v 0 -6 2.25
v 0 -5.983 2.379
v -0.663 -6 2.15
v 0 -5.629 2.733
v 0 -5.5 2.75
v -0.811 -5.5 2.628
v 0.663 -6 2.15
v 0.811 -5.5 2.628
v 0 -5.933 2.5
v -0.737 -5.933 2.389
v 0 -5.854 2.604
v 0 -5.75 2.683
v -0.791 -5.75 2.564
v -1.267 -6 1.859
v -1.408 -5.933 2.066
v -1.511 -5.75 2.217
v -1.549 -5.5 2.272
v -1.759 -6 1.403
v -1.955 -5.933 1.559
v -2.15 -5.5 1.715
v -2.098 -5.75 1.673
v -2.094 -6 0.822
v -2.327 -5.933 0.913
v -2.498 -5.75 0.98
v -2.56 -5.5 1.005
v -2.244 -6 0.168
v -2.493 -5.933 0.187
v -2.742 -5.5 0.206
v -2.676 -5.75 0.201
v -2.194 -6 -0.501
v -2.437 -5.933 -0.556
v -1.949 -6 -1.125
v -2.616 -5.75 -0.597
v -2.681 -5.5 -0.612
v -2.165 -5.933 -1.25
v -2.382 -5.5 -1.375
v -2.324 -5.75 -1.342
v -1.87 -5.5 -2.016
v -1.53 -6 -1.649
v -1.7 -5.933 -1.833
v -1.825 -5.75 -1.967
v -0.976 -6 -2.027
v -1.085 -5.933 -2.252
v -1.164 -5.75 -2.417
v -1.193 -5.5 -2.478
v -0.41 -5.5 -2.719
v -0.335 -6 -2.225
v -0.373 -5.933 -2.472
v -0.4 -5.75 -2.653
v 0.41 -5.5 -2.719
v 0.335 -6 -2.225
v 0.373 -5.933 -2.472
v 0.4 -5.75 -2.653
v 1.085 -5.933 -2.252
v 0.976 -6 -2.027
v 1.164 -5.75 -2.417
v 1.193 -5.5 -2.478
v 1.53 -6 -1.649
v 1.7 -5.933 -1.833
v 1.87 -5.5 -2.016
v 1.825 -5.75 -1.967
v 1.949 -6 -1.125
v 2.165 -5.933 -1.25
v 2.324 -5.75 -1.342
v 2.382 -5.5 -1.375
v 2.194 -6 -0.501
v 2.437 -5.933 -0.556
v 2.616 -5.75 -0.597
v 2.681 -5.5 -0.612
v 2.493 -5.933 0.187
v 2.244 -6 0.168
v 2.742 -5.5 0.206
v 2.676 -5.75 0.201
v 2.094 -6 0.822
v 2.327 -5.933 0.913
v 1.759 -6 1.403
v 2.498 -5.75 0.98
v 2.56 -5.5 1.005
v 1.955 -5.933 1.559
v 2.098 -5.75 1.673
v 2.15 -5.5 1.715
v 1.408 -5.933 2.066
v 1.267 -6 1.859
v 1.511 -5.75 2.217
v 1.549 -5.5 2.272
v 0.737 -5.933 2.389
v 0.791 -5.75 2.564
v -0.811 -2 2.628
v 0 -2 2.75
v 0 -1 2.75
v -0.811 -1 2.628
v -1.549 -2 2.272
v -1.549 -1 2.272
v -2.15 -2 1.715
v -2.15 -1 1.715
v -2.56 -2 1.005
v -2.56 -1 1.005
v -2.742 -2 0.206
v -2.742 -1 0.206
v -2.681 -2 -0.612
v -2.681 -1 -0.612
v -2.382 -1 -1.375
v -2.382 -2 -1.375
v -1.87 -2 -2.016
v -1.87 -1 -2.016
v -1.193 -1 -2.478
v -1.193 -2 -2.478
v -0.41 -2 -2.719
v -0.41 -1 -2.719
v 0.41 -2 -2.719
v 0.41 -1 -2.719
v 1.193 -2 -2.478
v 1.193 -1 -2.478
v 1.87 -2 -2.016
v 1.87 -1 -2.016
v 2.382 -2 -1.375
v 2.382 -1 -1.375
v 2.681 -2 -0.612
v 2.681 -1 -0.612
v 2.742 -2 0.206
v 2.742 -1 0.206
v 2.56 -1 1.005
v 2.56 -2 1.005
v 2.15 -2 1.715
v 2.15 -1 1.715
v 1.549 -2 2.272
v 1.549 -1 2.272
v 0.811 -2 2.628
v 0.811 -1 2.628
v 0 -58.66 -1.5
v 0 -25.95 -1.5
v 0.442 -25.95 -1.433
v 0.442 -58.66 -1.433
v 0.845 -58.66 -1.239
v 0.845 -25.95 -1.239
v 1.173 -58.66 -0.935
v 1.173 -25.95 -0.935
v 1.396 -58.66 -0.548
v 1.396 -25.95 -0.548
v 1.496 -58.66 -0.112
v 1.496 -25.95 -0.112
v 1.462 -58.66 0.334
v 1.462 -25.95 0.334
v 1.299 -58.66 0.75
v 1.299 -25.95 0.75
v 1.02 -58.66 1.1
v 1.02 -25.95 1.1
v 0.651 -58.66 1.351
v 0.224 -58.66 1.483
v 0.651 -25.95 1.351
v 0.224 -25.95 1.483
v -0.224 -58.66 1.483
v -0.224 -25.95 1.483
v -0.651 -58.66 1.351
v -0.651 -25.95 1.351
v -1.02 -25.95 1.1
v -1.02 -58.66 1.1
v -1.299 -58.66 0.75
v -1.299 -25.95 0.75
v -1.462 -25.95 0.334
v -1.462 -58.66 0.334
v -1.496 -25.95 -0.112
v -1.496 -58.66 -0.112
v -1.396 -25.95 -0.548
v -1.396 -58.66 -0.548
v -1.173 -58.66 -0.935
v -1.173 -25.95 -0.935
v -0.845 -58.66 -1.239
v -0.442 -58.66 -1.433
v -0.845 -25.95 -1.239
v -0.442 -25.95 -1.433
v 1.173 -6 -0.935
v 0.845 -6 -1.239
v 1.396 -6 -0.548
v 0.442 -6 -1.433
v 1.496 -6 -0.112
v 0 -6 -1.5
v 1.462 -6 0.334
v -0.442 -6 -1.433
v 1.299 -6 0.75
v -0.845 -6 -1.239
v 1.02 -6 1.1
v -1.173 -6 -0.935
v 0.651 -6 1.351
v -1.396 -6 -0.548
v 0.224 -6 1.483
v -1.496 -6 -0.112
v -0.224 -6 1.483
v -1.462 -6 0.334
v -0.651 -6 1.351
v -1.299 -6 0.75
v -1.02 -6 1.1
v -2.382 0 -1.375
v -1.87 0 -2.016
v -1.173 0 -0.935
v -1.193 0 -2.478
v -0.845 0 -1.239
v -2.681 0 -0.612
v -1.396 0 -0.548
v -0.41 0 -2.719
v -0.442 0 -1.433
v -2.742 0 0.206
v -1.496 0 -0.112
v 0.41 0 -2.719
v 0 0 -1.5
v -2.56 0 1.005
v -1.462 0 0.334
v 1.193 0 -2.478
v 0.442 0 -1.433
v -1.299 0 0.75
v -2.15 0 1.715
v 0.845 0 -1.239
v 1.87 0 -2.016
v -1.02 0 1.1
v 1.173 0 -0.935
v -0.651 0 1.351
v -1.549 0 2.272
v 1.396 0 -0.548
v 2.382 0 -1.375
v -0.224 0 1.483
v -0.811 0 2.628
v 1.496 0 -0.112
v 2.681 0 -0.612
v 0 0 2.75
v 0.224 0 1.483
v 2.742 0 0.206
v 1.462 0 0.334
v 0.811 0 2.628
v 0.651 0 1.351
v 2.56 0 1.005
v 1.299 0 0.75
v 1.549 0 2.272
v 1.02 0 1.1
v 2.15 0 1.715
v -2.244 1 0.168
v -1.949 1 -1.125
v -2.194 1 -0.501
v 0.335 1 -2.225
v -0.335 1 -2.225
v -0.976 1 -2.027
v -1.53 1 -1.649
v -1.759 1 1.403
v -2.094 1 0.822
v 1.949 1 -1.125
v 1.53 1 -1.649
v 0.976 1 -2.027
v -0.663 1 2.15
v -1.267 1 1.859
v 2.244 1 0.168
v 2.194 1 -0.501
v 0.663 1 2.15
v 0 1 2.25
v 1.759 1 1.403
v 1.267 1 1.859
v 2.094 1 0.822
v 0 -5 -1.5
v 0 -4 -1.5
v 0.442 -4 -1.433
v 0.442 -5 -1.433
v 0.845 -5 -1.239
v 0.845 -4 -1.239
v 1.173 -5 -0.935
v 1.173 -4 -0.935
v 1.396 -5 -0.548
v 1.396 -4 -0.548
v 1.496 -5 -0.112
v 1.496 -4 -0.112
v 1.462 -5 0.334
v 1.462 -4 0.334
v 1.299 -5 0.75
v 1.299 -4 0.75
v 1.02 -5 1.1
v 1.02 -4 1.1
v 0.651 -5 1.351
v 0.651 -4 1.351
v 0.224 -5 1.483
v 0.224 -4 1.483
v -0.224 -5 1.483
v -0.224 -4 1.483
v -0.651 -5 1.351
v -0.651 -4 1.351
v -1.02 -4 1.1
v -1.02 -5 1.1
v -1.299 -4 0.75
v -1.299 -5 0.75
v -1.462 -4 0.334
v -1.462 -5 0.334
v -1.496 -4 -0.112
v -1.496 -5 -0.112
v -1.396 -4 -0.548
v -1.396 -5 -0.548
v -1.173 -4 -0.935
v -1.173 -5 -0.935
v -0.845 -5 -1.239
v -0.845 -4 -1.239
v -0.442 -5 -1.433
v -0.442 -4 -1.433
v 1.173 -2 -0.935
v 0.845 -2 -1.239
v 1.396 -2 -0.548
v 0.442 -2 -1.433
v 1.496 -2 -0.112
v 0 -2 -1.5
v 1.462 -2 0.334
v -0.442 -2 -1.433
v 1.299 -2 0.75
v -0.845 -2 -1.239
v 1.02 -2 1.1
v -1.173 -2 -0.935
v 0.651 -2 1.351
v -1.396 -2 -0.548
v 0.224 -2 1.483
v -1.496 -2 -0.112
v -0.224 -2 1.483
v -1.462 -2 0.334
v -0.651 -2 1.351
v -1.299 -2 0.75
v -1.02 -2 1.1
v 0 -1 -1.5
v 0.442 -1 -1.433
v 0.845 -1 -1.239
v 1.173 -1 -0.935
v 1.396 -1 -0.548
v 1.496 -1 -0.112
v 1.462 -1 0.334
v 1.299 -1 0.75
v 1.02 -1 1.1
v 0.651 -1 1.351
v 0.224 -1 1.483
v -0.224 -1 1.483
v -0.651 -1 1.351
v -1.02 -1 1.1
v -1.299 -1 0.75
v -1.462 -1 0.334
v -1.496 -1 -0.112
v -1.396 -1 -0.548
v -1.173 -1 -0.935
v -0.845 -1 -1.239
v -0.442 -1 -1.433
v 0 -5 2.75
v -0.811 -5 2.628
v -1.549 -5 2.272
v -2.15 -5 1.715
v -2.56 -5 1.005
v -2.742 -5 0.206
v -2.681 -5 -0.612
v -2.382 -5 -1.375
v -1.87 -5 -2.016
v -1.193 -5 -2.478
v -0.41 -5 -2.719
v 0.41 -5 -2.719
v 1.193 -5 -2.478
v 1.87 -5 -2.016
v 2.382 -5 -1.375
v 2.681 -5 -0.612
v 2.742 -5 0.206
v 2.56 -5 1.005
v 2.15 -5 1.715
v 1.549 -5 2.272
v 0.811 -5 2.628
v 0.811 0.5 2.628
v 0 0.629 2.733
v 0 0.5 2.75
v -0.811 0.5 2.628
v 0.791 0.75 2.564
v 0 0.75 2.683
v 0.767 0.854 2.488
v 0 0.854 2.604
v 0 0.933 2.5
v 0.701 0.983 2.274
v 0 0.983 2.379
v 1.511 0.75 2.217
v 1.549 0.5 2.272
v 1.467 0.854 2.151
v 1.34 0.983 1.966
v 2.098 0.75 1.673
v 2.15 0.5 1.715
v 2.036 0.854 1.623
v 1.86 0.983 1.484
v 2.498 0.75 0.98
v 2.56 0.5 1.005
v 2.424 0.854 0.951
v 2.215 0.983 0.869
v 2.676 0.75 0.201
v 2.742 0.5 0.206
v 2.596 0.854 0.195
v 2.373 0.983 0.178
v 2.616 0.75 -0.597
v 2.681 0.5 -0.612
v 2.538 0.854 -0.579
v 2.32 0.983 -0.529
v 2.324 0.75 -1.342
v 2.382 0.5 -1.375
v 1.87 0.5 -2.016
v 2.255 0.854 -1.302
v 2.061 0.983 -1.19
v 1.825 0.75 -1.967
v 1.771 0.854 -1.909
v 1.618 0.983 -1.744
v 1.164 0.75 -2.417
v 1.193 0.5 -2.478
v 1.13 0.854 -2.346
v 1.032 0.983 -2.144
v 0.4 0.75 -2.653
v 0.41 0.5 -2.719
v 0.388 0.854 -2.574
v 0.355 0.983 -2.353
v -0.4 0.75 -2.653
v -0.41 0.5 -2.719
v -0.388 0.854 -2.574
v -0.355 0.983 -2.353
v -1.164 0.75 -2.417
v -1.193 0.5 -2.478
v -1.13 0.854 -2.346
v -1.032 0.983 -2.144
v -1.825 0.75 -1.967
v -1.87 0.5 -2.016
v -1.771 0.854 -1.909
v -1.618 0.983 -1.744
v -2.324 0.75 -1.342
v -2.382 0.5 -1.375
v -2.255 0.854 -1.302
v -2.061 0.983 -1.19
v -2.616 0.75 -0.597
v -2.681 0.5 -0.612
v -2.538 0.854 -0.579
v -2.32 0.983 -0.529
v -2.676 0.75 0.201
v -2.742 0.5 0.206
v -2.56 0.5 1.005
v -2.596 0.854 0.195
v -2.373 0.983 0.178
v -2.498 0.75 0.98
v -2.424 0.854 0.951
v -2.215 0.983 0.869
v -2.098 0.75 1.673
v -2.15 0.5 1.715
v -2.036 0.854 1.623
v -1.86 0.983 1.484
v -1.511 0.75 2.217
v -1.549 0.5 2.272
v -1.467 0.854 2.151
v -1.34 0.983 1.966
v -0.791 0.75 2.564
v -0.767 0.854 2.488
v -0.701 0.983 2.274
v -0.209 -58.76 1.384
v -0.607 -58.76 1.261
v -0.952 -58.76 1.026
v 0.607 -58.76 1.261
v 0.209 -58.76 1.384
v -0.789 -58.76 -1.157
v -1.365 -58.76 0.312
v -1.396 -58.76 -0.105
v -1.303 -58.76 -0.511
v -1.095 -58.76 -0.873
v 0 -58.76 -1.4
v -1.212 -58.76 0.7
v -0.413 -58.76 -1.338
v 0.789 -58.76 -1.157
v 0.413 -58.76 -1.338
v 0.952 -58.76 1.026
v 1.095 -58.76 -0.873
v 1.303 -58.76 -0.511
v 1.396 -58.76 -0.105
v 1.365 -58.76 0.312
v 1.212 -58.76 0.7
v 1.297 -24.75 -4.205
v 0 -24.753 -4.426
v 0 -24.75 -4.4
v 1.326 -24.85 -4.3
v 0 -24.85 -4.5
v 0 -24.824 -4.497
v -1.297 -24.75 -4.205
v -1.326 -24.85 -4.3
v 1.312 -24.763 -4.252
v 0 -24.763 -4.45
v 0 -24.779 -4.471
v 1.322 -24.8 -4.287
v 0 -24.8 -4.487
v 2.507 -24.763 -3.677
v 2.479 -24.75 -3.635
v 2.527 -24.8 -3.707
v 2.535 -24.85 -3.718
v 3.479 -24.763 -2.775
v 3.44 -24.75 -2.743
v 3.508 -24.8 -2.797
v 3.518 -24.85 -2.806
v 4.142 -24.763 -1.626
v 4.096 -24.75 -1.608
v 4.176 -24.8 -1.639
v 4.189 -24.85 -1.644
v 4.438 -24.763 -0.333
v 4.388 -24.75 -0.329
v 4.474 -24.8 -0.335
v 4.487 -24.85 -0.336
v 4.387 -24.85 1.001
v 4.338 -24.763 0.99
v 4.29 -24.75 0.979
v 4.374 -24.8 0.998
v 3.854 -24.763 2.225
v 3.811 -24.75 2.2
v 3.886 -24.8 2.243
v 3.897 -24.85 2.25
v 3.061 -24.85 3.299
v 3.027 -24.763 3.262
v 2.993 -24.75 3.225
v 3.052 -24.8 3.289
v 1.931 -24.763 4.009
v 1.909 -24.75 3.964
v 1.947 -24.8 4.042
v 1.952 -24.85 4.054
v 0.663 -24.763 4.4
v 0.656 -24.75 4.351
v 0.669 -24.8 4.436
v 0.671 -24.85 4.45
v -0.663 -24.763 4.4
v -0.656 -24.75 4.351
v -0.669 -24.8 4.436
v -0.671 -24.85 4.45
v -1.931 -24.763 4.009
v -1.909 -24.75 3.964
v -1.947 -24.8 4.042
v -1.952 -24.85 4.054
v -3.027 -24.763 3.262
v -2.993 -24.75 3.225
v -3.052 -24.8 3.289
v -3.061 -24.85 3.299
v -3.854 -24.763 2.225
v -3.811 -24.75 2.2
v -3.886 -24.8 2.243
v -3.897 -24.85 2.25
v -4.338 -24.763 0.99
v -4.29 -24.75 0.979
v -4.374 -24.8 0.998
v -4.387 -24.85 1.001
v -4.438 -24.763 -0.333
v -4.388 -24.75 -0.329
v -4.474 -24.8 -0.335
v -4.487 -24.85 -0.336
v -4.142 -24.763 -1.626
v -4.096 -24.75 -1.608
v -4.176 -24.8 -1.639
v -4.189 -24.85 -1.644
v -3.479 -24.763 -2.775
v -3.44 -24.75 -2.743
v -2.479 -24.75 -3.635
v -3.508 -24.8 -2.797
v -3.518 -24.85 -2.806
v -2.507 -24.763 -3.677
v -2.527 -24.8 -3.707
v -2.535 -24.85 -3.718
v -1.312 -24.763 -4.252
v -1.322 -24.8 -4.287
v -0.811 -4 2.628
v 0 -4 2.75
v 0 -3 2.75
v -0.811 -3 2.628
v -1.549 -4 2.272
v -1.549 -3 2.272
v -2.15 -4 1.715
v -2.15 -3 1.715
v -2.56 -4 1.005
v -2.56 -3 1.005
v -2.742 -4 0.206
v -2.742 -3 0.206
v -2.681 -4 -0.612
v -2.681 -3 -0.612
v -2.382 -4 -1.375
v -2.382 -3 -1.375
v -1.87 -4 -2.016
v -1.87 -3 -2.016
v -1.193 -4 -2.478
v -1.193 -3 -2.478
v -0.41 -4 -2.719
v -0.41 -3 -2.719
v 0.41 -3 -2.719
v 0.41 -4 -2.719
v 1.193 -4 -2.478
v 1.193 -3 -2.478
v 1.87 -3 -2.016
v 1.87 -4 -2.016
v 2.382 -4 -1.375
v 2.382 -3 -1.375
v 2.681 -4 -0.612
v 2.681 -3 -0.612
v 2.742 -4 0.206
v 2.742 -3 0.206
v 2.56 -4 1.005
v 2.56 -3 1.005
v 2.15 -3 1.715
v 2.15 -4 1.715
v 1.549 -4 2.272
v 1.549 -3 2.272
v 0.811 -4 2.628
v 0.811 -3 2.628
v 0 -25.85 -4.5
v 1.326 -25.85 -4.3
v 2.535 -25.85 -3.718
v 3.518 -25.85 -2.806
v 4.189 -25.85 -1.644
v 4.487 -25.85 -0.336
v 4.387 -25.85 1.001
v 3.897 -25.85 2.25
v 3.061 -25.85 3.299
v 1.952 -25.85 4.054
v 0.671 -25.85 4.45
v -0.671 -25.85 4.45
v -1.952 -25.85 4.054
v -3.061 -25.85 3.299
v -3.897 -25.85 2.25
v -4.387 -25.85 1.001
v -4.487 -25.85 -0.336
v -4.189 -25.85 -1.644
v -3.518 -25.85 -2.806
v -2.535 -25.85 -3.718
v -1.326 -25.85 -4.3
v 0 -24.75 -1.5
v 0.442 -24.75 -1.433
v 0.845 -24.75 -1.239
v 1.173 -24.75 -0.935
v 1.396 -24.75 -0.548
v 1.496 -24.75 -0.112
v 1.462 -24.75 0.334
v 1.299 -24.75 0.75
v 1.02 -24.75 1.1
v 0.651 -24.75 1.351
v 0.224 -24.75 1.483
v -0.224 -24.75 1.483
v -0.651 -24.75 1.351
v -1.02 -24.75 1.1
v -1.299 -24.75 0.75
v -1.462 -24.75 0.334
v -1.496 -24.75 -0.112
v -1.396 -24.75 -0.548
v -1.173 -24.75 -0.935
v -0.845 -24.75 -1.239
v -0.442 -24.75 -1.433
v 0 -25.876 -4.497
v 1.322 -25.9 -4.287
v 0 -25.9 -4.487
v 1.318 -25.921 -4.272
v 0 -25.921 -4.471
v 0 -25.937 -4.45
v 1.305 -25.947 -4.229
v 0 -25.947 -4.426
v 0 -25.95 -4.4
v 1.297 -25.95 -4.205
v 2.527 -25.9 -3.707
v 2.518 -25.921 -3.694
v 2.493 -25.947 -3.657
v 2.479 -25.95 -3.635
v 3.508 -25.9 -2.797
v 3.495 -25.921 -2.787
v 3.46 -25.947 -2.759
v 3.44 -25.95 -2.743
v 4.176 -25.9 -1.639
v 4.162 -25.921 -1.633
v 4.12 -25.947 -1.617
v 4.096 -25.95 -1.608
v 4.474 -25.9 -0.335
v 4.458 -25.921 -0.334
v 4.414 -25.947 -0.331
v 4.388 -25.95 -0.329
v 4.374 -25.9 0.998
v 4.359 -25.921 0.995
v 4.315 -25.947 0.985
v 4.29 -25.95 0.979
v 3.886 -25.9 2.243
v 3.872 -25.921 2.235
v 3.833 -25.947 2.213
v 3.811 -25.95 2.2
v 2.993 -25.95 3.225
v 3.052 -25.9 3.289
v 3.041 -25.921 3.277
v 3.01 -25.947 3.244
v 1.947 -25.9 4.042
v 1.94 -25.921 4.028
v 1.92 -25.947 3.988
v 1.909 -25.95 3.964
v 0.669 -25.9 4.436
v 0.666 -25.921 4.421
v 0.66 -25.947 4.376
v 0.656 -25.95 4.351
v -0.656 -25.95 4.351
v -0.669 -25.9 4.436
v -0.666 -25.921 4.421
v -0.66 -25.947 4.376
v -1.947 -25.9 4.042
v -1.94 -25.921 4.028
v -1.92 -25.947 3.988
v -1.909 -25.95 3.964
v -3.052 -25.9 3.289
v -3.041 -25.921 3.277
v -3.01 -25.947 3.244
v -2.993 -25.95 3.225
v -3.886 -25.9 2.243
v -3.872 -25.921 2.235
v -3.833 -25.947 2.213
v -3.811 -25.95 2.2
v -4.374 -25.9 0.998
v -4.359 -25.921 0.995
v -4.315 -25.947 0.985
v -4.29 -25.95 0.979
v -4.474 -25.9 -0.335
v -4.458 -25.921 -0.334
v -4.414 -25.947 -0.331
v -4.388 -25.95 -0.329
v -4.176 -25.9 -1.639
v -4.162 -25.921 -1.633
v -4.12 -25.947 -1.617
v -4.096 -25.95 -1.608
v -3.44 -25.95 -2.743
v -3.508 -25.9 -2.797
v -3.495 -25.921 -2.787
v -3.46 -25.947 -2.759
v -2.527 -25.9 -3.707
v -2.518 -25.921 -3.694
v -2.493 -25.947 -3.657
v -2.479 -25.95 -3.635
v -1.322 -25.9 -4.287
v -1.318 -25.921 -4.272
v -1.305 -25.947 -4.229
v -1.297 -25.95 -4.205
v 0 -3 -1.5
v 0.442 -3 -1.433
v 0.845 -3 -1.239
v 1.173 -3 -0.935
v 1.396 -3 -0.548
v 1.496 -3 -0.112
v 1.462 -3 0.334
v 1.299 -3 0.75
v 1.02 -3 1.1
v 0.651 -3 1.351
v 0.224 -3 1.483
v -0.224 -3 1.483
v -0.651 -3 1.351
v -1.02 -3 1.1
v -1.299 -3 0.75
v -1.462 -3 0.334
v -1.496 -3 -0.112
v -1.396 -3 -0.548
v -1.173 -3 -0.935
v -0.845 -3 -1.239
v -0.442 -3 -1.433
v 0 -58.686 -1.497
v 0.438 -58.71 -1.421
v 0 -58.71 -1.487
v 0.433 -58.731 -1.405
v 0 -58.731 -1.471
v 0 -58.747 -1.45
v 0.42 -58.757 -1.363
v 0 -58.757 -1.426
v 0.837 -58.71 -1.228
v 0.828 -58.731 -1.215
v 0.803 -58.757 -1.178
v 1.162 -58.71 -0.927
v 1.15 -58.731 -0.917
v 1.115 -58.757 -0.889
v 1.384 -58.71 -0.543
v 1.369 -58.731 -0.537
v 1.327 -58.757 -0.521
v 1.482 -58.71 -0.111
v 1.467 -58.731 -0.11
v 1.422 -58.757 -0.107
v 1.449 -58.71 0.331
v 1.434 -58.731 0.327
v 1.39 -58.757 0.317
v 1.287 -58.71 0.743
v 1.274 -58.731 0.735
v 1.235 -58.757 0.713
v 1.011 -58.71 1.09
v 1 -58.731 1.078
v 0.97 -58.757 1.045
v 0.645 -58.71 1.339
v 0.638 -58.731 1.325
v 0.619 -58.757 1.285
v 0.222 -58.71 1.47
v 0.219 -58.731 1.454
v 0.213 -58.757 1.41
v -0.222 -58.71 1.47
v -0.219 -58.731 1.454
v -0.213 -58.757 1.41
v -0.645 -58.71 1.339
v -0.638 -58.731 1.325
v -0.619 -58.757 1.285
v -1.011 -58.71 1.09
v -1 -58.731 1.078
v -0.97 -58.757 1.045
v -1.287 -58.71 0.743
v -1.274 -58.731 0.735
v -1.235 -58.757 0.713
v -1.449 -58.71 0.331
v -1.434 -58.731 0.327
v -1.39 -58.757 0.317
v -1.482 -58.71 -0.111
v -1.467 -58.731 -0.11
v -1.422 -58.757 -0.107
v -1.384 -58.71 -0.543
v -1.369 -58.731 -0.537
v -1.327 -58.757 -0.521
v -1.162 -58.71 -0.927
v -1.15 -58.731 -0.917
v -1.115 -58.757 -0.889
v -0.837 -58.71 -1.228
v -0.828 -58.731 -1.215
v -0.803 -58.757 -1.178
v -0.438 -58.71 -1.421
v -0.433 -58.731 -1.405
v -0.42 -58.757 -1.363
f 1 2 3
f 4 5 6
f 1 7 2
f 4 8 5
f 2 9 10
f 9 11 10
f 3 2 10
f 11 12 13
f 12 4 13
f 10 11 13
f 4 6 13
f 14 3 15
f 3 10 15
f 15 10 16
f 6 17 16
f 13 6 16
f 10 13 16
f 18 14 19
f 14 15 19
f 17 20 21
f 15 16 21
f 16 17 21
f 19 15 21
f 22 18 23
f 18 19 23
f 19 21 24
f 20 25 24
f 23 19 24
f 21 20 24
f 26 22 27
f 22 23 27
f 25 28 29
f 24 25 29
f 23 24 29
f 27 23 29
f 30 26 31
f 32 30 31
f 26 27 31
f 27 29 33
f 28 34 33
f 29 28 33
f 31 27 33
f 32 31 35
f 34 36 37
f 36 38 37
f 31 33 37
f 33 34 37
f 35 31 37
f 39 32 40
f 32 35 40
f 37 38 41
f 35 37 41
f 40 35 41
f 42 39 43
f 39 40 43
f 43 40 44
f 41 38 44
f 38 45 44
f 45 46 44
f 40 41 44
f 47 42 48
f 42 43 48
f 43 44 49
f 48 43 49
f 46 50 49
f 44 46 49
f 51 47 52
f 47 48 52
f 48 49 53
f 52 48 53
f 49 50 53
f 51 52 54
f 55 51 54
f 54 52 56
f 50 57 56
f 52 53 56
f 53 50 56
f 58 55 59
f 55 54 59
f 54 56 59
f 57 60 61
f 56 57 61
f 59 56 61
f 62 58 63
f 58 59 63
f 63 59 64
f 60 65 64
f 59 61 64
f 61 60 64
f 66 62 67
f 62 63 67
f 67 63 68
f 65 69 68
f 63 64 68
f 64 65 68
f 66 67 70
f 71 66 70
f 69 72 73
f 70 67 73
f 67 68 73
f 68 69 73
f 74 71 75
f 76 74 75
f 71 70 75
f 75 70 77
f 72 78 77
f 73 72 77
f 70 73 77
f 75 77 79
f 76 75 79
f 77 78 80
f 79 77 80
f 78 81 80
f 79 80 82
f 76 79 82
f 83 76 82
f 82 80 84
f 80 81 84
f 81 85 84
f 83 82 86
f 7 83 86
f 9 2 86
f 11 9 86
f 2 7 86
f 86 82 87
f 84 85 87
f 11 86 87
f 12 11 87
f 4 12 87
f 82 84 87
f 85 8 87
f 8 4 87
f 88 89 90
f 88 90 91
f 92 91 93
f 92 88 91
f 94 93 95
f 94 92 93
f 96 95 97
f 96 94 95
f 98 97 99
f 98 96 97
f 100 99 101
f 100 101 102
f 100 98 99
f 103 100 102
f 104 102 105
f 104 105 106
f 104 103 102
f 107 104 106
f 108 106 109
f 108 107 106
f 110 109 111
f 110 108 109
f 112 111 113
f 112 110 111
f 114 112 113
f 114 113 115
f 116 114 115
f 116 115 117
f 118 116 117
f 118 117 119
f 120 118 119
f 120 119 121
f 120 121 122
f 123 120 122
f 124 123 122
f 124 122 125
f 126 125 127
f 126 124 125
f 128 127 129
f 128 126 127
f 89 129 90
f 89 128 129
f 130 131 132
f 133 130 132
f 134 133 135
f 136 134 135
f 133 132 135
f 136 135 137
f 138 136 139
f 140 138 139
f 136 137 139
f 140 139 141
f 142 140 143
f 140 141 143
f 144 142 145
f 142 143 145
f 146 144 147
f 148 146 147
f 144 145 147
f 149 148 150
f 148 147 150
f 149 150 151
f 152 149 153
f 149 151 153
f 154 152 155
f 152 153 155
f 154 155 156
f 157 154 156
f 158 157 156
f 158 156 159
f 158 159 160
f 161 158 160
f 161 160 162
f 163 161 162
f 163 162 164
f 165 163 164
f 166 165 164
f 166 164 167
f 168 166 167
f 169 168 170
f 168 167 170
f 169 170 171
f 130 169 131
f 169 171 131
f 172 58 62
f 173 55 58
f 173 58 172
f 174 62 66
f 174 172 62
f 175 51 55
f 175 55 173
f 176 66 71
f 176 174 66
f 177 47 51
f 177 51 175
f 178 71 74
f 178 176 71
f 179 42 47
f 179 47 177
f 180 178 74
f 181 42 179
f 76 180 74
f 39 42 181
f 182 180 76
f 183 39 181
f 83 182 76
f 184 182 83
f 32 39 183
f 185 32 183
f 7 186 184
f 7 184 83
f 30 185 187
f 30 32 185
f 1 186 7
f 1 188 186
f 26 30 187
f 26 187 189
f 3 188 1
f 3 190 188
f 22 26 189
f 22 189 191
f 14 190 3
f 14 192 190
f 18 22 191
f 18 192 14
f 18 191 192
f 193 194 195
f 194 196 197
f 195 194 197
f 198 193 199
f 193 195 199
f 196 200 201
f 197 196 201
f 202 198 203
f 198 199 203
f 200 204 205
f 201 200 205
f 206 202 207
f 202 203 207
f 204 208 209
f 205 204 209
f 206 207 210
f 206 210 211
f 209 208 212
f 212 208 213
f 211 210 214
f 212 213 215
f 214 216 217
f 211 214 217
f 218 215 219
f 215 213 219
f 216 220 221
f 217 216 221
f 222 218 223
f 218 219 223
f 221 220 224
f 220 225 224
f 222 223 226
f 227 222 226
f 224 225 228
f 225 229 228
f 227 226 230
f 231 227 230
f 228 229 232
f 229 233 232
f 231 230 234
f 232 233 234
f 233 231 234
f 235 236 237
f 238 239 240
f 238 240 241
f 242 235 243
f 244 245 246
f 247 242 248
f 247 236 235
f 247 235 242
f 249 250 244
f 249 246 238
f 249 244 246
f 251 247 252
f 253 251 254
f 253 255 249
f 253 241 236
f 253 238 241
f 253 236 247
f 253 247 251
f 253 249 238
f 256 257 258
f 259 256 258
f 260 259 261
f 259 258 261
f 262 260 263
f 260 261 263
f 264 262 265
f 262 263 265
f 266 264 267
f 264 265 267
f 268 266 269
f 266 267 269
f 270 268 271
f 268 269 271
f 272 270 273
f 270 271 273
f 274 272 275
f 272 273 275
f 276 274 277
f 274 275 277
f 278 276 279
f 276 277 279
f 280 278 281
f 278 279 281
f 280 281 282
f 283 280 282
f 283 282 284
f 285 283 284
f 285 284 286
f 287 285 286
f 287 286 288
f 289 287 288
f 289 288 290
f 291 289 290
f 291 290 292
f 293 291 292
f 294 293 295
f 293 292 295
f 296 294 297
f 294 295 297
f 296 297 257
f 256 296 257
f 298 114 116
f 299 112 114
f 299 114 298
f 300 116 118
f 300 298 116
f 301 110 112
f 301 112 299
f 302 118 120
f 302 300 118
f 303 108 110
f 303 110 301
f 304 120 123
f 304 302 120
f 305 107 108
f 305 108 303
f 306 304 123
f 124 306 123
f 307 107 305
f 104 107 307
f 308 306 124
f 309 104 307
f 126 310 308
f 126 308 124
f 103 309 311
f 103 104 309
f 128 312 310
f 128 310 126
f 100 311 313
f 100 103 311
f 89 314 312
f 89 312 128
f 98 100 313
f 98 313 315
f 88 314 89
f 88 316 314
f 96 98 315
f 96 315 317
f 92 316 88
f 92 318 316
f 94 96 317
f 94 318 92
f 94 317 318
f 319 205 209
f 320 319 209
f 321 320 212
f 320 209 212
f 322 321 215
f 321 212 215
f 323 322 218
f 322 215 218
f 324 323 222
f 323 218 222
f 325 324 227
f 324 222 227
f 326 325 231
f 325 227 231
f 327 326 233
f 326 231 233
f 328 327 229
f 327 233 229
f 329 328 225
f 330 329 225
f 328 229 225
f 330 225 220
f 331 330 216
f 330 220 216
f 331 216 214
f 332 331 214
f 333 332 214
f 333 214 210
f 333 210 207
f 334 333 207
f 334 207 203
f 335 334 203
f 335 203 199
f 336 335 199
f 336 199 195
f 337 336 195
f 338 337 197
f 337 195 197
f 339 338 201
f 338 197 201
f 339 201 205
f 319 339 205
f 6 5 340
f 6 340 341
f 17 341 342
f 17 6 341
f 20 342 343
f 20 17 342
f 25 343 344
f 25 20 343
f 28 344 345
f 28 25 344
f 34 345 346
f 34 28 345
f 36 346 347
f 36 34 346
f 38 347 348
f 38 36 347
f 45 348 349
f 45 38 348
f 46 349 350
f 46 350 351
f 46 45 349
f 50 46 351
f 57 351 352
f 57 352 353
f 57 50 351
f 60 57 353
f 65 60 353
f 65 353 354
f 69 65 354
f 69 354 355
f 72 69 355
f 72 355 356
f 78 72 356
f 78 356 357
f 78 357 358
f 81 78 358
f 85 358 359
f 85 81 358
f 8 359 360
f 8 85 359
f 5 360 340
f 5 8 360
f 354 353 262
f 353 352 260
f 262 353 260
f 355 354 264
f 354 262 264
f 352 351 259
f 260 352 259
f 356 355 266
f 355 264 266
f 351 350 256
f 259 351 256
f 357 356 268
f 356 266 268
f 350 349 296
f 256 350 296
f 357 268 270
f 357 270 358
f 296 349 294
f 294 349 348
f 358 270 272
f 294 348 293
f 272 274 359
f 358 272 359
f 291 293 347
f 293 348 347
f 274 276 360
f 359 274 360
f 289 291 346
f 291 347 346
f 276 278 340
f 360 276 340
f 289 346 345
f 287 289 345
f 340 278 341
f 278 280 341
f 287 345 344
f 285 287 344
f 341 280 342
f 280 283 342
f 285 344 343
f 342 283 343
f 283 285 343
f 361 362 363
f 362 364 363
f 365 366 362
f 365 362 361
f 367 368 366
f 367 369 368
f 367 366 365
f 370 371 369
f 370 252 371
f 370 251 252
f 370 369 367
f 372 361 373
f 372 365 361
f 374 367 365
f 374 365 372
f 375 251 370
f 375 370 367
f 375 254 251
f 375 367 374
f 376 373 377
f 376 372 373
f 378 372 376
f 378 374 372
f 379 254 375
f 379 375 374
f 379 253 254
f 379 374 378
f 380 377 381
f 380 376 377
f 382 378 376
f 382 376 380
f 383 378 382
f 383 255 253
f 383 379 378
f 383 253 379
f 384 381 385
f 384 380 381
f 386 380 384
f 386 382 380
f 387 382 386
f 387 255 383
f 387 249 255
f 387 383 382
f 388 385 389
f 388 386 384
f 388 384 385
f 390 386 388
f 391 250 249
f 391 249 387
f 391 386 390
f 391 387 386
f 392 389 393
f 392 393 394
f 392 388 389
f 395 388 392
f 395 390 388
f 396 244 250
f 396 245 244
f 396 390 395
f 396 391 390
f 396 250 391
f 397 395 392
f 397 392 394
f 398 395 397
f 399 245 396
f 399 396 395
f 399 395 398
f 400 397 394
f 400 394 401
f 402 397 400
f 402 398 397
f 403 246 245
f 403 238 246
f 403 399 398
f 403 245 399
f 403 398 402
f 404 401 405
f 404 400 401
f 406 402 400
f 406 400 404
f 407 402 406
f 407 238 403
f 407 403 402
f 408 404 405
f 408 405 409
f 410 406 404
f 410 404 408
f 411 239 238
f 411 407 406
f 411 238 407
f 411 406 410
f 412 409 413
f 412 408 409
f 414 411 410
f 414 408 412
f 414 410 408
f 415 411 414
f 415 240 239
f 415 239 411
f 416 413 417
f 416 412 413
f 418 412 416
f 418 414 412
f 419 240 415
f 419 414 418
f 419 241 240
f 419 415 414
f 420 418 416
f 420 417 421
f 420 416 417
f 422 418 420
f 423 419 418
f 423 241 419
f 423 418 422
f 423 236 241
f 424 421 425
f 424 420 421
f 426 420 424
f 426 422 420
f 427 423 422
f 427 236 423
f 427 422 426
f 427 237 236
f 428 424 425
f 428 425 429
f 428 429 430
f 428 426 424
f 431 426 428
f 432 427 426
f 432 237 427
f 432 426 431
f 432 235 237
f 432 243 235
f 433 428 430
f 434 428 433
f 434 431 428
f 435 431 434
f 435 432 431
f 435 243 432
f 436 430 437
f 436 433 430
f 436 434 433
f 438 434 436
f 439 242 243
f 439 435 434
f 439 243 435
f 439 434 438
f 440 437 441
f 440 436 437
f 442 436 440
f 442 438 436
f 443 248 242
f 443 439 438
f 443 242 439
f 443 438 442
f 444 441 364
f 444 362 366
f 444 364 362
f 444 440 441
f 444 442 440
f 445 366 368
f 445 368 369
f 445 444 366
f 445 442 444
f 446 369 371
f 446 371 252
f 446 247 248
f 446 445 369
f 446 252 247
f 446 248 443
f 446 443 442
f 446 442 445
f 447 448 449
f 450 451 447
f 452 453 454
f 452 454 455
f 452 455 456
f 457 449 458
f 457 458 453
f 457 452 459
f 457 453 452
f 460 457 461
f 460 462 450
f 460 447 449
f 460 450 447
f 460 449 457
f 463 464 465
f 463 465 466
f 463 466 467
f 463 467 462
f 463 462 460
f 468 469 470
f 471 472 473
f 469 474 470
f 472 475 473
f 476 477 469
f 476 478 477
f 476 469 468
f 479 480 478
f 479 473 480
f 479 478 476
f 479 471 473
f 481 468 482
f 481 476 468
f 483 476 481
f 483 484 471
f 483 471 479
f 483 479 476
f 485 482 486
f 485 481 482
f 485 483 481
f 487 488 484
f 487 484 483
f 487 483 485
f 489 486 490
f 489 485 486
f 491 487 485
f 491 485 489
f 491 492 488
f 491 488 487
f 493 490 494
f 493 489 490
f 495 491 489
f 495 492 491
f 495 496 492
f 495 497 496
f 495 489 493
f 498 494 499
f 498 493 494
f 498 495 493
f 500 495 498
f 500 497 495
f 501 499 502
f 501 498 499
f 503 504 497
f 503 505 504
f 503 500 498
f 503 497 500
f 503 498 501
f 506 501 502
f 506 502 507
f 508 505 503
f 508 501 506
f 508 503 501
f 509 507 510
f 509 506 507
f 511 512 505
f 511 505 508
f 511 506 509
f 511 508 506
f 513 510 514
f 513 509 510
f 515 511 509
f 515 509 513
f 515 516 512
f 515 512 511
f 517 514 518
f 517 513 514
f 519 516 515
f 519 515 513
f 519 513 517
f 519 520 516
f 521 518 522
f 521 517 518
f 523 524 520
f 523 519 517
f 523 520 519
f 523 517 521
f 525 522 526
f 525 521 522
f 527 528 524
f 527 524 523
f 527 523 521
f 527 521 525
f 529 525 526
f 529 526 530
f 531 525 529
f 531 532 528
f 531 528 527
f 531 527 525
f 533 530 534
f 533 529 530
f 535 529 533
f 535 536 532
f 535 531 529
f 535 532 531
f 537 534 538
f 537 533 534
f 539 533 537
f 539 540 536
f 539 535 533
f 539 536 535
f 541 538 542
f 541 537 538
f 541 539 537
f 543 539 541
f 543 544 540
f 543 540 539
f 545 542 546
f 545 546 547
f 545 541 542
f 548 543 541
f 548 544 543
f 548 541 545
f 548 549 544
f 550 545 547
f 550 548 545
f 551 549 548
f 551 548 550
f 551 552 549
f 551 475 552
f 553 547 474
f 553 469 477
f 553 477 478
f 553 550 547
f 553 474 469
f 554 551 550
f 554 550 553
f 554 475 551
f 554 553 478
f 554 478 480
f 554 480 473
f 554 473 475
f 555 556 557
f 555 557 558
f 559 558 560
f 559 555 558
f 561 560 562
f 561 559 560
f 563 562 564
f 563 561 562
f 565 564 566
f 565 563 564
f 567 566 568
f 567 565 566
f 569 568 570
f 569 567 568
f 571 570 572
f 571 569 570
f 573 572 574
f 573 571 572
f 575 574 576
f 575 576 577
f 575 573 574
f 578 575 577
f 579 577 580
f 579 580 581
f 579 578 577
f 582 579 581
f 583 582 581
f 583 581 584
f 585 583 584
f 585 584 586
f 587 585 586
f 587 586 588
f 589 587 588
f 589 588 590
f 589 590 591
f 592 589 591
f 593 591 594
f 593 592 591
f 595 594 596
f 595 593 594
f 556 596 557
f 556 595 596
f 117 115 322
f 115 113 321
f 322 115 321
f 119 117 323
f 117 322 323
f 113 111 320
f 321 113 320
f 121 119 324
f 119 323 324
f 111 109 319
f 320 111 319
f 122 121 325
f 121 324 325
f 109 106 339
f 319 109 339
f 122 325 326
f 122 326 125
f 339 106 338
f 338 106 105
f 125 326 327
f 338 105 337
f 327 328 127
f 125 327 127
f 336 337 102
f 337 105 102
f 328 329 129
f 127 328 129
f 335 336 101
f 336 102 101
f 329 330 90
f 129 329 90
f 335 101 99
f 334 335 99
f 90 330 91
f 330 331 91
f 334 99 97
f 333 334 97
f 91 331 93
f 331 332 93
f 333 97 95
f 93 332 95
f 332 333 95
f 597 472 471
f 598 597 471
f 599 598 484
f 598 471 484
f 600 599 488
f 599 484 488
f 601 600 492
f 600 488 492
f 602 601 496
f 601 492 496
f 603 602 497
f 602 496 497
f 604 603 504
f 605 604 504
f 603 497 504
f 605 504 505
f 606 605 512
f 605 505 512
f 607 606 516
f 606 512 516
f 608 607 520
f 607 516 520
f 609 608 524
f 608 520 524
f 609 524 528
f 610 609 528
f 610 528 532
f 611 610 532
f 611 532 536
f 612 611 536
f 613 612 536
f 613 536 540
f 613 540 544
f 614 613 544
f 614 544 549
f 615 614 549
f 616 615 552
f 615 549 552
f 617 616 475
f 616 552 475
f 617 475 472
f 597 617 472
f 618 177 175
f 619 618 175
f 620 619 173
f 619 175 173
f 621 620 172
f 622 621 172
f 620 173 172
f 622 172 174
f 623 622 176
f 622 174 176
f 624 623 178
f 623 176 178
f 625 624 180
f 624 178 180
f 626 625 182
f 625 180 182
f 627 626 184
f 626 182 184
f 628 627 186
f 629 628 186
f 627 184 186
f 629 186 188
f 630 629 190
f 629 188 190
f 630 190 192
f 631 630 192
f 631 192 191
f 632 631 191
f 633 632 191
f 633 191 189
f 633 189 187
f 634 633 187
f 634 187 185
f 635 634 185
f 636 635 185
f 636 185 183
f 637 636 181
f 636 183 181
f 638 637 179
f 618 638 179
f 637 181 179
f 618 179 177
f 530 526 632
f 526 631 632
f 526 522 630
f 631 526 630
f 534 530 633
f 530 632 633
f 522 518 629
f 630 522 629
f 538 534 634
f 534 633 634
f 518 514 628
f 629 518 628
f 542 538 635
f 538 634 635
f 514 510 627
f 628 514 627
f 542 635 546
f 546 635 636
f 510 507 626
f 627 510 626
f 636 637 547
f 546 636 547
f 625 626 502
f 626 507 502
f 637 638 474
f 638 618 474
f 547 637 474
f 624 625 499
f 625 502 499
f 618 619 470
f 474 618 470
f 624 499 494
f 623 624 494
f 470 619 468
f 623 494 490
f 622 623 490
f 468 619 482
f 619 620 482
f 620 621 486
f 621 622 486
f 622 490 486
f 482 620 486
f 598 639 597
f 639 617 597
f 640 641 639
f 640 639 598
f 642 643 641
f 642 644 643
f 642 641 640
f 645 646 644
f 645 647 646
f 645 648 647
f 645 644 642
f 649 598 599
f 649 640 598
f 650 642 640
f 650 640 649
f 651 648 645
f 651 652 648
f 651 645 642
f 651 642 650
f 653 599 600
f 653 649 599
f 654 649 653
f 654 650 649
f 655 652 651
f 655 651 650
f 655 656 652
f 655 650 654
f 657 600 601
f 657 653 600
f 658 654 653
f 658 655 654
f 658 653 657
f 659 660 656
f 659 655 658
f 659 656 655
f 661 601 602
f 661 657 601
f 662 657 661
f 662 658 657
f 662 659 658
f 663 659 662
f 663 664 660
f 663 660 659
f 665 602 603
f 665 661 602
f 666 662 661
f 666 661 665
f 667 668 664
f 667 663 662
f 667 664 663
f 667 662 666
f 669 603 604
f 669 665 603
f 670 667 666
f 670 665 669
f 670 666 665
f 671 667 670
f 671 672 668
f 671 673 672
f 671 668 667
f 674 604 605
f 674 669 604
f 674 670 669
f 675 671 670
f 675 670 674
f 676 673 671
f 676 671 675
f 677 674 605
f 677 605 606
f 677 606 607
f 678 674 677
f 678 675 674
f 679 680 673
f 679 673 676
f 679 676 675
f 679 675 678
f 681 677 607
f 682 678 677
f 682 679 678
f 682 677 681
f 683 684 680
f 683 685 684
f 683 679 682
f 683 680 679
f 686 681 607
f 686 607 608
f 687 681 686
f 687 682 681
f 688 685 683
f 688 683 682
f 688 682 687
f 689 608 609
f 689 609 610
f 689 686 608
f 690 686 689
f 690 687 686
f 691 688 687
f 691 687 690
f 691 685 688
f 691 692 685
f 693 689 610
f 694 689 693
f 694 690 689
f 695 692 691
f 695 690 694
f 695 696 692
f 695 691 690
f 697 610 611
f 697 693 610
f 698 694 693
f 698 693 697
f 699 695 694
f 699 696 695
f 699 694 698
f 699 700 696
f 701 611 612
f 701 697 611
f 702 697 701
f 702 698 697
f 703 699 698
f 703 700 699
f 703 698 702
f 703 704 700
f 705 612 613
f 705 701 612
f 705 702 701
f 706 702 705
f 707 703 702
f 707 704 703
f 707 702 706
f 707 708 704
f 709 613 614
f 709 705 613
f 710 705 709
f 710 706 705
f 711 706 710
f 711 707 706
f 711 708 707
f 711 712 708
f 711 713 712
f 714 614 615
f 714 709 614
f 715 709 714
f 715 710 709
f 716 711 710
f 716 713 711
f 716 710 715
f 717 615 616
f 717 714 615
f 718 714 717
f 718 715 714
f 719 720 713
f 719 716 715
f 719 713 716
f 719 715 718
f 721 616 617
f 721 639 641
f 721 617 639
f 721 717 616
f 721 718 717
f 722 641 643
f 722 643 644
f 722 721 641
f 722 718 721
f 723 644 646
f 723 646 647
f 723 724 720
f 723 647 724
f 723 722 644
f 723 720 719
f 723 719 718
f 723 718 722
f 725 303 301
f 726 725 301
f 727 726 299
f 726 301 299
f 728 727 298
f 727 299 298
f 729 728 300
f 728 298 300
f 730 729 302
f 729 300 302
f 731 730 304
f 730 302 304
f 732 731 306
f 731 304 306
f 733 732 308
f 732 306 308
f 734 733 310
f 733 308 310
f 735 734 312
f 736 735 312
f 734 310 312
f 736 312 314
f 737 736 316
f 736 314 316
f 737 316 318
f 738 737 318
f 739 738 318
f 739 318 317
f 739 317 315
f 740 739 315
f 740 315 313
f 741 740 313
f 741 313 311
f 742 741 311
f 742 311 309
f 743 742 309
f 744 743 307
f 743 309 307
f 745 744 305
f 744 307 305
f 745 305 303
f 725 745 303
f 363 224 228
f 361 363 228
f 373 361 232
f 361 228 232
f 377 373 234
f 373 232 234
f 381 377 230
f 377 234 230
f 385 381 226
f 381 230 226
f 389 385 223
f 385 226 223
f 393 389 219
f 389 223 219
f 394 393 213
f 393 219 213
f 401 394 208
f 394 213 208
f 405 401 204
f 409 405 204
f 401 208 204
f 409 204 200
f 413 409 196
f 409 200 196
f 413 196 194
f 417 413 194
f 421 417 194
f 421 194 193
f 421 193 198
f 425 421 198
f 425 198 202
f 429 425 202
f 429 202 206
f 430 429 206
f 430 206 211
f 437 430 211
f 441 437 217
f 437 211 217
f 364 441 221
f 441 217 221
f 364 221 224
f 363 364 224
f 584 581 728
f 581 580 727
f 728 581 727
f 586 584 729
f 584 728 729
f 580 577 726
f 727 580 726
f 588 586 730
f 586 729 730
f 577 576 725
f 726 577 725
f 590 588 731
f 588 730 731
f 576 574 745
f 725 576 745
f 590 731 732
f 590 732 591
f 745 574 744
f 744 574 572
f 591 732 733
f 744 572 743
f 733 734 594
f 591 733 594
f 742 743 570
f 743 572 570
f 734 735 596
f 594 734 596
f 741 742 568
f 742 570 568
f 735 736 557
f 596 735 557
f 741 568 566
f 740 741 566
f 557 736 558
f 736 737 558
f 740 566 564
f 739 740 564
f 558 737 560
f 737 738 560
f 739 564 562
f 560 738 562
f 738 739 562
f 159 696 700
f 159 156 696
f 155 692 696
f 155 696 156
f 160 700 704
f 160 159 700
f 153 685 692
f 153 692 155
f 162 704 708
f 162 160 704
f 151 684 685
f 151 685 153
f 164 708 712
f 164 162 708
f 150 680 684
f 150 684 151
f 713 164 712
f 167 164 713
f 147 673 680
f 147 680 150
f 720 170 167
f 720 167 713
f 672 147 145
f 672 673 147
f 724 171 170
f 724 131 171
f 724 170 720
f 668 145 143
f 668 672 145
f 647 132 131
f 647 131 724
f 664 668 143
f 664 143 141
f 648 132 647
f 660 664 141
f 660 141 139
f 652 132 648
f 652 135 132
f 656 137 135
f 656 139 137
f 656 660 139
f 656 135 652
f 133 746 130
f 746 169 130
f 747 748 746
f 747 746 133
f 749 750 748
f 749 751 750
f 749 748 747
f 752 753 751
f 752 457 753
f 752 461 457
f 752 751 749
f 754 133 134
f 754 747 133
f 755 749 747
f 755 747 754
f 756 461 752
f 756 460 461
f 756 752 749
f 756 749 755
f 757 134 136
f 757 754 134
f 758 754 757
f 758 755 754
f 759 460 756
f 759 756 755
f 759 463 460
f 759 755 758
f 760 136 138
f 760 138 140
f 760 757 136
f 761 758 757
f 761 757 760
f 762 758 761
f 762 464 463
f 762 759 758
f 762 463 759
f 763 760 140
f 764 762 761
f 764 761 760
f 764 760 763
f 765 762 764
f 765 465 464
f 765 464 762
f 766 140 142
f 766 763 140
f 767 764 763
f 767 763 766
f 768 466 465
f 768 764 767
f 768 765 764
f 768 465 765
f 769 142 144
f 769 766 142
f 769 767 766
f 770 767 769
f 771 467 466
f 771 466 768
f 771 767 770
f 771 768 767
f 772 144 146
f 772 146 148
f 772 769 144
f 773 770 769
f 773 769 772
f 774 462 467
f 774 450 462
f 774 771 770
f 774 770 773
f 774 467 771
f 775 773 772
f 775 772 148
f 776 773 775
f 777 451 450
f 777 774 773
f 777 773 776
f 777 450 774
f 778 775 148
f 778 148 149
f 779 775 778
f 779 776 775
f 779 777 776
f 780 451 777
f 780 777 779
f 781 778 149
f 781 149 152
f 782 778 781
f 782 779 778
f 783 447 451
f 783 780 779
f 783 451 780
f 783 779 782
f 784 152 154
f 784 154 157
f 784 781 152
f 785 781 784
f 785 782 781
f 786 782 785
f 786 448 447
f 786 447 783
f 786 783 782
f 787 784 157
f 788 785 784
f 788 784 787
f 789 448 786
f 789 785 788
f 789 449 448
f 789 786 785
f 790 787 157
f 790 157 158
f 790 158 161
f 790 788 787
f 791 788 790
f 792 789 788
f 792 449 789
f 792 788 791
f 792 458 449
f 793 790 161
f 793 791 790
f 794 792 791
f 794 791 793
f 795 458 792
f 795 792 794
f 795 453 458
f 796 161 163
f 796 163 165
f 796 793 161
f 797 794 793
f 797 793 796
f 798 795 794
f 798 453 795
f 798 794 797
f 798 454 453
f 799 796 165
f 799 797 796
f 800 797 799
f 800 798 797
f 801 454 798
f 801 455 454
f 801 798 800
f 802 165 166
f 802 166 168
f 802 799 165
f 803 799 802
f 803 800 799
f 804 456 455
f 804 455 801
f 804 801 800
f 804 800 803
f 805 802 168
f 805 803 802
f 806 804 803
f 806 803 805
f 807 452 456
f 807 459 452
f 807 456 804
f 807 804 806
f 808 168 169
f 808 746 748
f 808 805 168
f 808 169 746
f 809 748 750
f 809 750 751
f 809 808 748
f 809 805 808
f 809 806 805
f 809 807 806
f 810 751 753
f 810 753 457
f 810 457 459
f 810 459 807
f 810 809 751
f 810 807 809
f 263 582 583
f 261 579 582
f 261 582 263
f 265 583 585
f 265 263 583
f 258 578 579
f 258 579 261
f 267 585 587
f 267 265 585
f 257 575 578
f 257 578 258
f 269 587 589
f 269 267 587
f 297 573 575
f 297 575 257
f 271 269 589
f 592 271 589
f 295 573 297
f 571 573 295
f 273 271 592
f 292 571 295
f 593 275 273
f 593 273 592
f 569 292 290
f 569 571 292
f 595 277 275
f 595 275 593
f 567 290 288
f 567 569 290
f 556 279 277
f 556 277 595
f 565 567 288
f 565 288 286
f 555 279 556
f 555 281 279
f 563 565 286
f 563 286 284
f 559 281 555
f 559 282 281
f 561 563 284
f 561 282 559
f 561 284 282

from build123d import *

# Parameters (mm, degrees)
SKETCH1_R            = 2.75
BOSS_EXTRUDE1_DEPTH  = 1
SKETCH2_R            = 1.5
BOSS_EXTRUDE2_DEPTH  = 1
BOSS_EXTRUDE3_START  = 1
SKETCH3_R            = 2.75
BOSS_EXTRUDE3_DEPTH  = 1
SKETCH4_R            = 1.5
BOSS_EXTRUDE4_DEPTH  = 1
BOSS_EXTRUDE5_START  = 1
SKETCH5_R            = 2.75
BOSS_EXTRUDE5_DEPTH  = 1
SKETCH6_R            = 1.5
BOSS_EXTRUDE6_DEPTH  = 1
BOSS_EXTRUDE7_START  = 1
SKETCH7_R            = 2.75
BOSS_EXTRUDE7_DEPTH  = 1
SKETCH8_R            = 1.5
BOSS_EXTRUDE8_DEPTH  = 18.75
SKETCH9_R            = 4.5
BOSS_EXTRUDE9_DEPTH  = 1.2
SKETCH10_R           = 1.5
BOSS_EXTRUDE10_DEPTH = 32.81
FILLET1_R            = 0.5
FILLET2_R            = 0.1
FILLET3_R            = 0.5
FILLET4_R            = 0.1


with BuildPart() as part:
    # Sketch1 → Boss-Extrude1 (new body)
    with BuildSketch(Plane(origin=(0, 0, 0), x_dir=(1, 0, 0), z_dir=(0, 1, 0))):
        with Locations(Location((0, 0, 0), (0, 0, 270))):
            Circle(SKETCH1_R)
    extrude(amount=BOSS_EXTRUDE1_DEPTH)

    # Sketch2 → Boss-Extrude2 (add)
    with BuildSketch(Plane.XZ):
        with Locations(Location((0, 0, 0), (0, 0, 270))):
            Circle(SKETCH2_R)
    extrude(amount=BOSS_EXTRUDE2_DEPTH)

    # Sketch3 → Boss-Extrude3 (add)
    with BuildSketch(Plane(origin=(0, -1, 0), x_dir=(-1, 0, 0), z_dir=(0, -1, 0)).offset(BOSS_EXTRUDE3_START)):
        with Locations(Location((0, 0, 0), (0, 0, 270))):
            Circle(SKETCH3_R)
    extrude(amount=-BOSS_EXTRUDE3_DEPTH)

    # Sketch4 → Boss-Extrude4 (add)
    with BuildSketch(Plane(origin=(0, -2, 0), x_dir=(-1, 0, 0), z_dir=(0, -1, 0))):
        with Locations(Location((0, 0, 0), (0, 0, 90))):
            Circle(SKETCH4_R)
    extrude(amount=BOSS_EXTRUDE4_DEPTH)

    # Sketch5 → Boss-Extrude5 (add)
    with BuildSketch(Plane(origin=(0, -3, 0), x_dir=(-1, 0, 0), z_dir=(0, -1, 0)).offset(BOSS_EXTRUDE5_START)):
        with Locations(Location((0, 0, 0), (0, 0, 270))):
            Circle(SKETCH5_R)
    extrude(amount=-BOSS_EXTRUDE5_DEPTH)

    # Sketch6 → Boss-Extrude6 (add)
    with BuildSketch(Plane.XZ.offset(4)):
        with Locations(Location((0, 0, 0), (0, 0, 270))):
            Circle(SKETCH6_R)
    extrude(amount=BOSS_EXTRUDE6_DEPTH)

    # Sketch7 → Boss-Extrude7 (add)
    with BuildSketch(Plane.XZ.offset(5).offset(BOSS_EXTRUDE7_START)):
        with Locations(Location((0, 0, 0), (0, 0, 90))):
            Circle(SKETCH7_R)
    extrude(amount=-BOSS_EXTRUDE7_DEPTH)

    # Sketch8 → Boss-Extrude8 (add)
    with BuildSketch(Plane(origin=(0, -6, 0), x_dir=(-1, 0, 0), z_dir=(0, -1, 0))):
        with Locations(Location((0, 0, 0), (0, 0, 90))):
            Circle(SKETCH8_R)
    extrude(amount=BOSS_EXTRUDE8_DEPTH)

    # Sketch9 → Boss-Extrude9 (add)
    with BuildSketch(Plane(origin=(0, -24.75, 0), x_dir=(-1, 0, 0), z_dir=(0, -1, 0))):
        with Locations(Location((0, 0, 0), (0, 0, 90))):
            Circle(SKETCH9_R)
    extrude(amount=BOSS_EXTRUDE9_DEPTH)

    # Sketch10 → Boss-Extrude10 (add)
    with BuildSketch(Plane.XZ.offset(25.95)):
        with Locations(Location((0, 0, 0), (0, 0, 270))):
            Circle(SKETCH10_R)
    extrude(amount=BOSS_EXTRUDE10_DEPTH)

    # Fillet1
    fillet1_edges = [part.edges().sort_by_distance(p)[0] for p in [
        (0, 1, -2.75),
    ]]
    fillet(fillet1_edges, radius=FILLET1_R)

    # Fillet2
    fillet2_edges = [part.edges().sort_by_distance(p)[0] for p in [
        (0, -24.75, 4.5),
        (0, -25.95, 4.5),
    ]]
    fillet(fillet2_edges, radius=FILLET2_R)

    # Fillet3
    fillet3_edges = [part.edges().sort_by_distance(p)[0] for p in [
        (0, -6, -2.75),
    ]]
    fillet(fillet3_edges, radius=FILLET3_R)

    # Fillet4
    fillet4_edges = [part.edges().sort_by_distance(p)[0] for p in [
        (0, -58.76, 1.5),
    ]]
    fillet(fillet4_edges, radius=FILLET4_R)


solid = part.part
